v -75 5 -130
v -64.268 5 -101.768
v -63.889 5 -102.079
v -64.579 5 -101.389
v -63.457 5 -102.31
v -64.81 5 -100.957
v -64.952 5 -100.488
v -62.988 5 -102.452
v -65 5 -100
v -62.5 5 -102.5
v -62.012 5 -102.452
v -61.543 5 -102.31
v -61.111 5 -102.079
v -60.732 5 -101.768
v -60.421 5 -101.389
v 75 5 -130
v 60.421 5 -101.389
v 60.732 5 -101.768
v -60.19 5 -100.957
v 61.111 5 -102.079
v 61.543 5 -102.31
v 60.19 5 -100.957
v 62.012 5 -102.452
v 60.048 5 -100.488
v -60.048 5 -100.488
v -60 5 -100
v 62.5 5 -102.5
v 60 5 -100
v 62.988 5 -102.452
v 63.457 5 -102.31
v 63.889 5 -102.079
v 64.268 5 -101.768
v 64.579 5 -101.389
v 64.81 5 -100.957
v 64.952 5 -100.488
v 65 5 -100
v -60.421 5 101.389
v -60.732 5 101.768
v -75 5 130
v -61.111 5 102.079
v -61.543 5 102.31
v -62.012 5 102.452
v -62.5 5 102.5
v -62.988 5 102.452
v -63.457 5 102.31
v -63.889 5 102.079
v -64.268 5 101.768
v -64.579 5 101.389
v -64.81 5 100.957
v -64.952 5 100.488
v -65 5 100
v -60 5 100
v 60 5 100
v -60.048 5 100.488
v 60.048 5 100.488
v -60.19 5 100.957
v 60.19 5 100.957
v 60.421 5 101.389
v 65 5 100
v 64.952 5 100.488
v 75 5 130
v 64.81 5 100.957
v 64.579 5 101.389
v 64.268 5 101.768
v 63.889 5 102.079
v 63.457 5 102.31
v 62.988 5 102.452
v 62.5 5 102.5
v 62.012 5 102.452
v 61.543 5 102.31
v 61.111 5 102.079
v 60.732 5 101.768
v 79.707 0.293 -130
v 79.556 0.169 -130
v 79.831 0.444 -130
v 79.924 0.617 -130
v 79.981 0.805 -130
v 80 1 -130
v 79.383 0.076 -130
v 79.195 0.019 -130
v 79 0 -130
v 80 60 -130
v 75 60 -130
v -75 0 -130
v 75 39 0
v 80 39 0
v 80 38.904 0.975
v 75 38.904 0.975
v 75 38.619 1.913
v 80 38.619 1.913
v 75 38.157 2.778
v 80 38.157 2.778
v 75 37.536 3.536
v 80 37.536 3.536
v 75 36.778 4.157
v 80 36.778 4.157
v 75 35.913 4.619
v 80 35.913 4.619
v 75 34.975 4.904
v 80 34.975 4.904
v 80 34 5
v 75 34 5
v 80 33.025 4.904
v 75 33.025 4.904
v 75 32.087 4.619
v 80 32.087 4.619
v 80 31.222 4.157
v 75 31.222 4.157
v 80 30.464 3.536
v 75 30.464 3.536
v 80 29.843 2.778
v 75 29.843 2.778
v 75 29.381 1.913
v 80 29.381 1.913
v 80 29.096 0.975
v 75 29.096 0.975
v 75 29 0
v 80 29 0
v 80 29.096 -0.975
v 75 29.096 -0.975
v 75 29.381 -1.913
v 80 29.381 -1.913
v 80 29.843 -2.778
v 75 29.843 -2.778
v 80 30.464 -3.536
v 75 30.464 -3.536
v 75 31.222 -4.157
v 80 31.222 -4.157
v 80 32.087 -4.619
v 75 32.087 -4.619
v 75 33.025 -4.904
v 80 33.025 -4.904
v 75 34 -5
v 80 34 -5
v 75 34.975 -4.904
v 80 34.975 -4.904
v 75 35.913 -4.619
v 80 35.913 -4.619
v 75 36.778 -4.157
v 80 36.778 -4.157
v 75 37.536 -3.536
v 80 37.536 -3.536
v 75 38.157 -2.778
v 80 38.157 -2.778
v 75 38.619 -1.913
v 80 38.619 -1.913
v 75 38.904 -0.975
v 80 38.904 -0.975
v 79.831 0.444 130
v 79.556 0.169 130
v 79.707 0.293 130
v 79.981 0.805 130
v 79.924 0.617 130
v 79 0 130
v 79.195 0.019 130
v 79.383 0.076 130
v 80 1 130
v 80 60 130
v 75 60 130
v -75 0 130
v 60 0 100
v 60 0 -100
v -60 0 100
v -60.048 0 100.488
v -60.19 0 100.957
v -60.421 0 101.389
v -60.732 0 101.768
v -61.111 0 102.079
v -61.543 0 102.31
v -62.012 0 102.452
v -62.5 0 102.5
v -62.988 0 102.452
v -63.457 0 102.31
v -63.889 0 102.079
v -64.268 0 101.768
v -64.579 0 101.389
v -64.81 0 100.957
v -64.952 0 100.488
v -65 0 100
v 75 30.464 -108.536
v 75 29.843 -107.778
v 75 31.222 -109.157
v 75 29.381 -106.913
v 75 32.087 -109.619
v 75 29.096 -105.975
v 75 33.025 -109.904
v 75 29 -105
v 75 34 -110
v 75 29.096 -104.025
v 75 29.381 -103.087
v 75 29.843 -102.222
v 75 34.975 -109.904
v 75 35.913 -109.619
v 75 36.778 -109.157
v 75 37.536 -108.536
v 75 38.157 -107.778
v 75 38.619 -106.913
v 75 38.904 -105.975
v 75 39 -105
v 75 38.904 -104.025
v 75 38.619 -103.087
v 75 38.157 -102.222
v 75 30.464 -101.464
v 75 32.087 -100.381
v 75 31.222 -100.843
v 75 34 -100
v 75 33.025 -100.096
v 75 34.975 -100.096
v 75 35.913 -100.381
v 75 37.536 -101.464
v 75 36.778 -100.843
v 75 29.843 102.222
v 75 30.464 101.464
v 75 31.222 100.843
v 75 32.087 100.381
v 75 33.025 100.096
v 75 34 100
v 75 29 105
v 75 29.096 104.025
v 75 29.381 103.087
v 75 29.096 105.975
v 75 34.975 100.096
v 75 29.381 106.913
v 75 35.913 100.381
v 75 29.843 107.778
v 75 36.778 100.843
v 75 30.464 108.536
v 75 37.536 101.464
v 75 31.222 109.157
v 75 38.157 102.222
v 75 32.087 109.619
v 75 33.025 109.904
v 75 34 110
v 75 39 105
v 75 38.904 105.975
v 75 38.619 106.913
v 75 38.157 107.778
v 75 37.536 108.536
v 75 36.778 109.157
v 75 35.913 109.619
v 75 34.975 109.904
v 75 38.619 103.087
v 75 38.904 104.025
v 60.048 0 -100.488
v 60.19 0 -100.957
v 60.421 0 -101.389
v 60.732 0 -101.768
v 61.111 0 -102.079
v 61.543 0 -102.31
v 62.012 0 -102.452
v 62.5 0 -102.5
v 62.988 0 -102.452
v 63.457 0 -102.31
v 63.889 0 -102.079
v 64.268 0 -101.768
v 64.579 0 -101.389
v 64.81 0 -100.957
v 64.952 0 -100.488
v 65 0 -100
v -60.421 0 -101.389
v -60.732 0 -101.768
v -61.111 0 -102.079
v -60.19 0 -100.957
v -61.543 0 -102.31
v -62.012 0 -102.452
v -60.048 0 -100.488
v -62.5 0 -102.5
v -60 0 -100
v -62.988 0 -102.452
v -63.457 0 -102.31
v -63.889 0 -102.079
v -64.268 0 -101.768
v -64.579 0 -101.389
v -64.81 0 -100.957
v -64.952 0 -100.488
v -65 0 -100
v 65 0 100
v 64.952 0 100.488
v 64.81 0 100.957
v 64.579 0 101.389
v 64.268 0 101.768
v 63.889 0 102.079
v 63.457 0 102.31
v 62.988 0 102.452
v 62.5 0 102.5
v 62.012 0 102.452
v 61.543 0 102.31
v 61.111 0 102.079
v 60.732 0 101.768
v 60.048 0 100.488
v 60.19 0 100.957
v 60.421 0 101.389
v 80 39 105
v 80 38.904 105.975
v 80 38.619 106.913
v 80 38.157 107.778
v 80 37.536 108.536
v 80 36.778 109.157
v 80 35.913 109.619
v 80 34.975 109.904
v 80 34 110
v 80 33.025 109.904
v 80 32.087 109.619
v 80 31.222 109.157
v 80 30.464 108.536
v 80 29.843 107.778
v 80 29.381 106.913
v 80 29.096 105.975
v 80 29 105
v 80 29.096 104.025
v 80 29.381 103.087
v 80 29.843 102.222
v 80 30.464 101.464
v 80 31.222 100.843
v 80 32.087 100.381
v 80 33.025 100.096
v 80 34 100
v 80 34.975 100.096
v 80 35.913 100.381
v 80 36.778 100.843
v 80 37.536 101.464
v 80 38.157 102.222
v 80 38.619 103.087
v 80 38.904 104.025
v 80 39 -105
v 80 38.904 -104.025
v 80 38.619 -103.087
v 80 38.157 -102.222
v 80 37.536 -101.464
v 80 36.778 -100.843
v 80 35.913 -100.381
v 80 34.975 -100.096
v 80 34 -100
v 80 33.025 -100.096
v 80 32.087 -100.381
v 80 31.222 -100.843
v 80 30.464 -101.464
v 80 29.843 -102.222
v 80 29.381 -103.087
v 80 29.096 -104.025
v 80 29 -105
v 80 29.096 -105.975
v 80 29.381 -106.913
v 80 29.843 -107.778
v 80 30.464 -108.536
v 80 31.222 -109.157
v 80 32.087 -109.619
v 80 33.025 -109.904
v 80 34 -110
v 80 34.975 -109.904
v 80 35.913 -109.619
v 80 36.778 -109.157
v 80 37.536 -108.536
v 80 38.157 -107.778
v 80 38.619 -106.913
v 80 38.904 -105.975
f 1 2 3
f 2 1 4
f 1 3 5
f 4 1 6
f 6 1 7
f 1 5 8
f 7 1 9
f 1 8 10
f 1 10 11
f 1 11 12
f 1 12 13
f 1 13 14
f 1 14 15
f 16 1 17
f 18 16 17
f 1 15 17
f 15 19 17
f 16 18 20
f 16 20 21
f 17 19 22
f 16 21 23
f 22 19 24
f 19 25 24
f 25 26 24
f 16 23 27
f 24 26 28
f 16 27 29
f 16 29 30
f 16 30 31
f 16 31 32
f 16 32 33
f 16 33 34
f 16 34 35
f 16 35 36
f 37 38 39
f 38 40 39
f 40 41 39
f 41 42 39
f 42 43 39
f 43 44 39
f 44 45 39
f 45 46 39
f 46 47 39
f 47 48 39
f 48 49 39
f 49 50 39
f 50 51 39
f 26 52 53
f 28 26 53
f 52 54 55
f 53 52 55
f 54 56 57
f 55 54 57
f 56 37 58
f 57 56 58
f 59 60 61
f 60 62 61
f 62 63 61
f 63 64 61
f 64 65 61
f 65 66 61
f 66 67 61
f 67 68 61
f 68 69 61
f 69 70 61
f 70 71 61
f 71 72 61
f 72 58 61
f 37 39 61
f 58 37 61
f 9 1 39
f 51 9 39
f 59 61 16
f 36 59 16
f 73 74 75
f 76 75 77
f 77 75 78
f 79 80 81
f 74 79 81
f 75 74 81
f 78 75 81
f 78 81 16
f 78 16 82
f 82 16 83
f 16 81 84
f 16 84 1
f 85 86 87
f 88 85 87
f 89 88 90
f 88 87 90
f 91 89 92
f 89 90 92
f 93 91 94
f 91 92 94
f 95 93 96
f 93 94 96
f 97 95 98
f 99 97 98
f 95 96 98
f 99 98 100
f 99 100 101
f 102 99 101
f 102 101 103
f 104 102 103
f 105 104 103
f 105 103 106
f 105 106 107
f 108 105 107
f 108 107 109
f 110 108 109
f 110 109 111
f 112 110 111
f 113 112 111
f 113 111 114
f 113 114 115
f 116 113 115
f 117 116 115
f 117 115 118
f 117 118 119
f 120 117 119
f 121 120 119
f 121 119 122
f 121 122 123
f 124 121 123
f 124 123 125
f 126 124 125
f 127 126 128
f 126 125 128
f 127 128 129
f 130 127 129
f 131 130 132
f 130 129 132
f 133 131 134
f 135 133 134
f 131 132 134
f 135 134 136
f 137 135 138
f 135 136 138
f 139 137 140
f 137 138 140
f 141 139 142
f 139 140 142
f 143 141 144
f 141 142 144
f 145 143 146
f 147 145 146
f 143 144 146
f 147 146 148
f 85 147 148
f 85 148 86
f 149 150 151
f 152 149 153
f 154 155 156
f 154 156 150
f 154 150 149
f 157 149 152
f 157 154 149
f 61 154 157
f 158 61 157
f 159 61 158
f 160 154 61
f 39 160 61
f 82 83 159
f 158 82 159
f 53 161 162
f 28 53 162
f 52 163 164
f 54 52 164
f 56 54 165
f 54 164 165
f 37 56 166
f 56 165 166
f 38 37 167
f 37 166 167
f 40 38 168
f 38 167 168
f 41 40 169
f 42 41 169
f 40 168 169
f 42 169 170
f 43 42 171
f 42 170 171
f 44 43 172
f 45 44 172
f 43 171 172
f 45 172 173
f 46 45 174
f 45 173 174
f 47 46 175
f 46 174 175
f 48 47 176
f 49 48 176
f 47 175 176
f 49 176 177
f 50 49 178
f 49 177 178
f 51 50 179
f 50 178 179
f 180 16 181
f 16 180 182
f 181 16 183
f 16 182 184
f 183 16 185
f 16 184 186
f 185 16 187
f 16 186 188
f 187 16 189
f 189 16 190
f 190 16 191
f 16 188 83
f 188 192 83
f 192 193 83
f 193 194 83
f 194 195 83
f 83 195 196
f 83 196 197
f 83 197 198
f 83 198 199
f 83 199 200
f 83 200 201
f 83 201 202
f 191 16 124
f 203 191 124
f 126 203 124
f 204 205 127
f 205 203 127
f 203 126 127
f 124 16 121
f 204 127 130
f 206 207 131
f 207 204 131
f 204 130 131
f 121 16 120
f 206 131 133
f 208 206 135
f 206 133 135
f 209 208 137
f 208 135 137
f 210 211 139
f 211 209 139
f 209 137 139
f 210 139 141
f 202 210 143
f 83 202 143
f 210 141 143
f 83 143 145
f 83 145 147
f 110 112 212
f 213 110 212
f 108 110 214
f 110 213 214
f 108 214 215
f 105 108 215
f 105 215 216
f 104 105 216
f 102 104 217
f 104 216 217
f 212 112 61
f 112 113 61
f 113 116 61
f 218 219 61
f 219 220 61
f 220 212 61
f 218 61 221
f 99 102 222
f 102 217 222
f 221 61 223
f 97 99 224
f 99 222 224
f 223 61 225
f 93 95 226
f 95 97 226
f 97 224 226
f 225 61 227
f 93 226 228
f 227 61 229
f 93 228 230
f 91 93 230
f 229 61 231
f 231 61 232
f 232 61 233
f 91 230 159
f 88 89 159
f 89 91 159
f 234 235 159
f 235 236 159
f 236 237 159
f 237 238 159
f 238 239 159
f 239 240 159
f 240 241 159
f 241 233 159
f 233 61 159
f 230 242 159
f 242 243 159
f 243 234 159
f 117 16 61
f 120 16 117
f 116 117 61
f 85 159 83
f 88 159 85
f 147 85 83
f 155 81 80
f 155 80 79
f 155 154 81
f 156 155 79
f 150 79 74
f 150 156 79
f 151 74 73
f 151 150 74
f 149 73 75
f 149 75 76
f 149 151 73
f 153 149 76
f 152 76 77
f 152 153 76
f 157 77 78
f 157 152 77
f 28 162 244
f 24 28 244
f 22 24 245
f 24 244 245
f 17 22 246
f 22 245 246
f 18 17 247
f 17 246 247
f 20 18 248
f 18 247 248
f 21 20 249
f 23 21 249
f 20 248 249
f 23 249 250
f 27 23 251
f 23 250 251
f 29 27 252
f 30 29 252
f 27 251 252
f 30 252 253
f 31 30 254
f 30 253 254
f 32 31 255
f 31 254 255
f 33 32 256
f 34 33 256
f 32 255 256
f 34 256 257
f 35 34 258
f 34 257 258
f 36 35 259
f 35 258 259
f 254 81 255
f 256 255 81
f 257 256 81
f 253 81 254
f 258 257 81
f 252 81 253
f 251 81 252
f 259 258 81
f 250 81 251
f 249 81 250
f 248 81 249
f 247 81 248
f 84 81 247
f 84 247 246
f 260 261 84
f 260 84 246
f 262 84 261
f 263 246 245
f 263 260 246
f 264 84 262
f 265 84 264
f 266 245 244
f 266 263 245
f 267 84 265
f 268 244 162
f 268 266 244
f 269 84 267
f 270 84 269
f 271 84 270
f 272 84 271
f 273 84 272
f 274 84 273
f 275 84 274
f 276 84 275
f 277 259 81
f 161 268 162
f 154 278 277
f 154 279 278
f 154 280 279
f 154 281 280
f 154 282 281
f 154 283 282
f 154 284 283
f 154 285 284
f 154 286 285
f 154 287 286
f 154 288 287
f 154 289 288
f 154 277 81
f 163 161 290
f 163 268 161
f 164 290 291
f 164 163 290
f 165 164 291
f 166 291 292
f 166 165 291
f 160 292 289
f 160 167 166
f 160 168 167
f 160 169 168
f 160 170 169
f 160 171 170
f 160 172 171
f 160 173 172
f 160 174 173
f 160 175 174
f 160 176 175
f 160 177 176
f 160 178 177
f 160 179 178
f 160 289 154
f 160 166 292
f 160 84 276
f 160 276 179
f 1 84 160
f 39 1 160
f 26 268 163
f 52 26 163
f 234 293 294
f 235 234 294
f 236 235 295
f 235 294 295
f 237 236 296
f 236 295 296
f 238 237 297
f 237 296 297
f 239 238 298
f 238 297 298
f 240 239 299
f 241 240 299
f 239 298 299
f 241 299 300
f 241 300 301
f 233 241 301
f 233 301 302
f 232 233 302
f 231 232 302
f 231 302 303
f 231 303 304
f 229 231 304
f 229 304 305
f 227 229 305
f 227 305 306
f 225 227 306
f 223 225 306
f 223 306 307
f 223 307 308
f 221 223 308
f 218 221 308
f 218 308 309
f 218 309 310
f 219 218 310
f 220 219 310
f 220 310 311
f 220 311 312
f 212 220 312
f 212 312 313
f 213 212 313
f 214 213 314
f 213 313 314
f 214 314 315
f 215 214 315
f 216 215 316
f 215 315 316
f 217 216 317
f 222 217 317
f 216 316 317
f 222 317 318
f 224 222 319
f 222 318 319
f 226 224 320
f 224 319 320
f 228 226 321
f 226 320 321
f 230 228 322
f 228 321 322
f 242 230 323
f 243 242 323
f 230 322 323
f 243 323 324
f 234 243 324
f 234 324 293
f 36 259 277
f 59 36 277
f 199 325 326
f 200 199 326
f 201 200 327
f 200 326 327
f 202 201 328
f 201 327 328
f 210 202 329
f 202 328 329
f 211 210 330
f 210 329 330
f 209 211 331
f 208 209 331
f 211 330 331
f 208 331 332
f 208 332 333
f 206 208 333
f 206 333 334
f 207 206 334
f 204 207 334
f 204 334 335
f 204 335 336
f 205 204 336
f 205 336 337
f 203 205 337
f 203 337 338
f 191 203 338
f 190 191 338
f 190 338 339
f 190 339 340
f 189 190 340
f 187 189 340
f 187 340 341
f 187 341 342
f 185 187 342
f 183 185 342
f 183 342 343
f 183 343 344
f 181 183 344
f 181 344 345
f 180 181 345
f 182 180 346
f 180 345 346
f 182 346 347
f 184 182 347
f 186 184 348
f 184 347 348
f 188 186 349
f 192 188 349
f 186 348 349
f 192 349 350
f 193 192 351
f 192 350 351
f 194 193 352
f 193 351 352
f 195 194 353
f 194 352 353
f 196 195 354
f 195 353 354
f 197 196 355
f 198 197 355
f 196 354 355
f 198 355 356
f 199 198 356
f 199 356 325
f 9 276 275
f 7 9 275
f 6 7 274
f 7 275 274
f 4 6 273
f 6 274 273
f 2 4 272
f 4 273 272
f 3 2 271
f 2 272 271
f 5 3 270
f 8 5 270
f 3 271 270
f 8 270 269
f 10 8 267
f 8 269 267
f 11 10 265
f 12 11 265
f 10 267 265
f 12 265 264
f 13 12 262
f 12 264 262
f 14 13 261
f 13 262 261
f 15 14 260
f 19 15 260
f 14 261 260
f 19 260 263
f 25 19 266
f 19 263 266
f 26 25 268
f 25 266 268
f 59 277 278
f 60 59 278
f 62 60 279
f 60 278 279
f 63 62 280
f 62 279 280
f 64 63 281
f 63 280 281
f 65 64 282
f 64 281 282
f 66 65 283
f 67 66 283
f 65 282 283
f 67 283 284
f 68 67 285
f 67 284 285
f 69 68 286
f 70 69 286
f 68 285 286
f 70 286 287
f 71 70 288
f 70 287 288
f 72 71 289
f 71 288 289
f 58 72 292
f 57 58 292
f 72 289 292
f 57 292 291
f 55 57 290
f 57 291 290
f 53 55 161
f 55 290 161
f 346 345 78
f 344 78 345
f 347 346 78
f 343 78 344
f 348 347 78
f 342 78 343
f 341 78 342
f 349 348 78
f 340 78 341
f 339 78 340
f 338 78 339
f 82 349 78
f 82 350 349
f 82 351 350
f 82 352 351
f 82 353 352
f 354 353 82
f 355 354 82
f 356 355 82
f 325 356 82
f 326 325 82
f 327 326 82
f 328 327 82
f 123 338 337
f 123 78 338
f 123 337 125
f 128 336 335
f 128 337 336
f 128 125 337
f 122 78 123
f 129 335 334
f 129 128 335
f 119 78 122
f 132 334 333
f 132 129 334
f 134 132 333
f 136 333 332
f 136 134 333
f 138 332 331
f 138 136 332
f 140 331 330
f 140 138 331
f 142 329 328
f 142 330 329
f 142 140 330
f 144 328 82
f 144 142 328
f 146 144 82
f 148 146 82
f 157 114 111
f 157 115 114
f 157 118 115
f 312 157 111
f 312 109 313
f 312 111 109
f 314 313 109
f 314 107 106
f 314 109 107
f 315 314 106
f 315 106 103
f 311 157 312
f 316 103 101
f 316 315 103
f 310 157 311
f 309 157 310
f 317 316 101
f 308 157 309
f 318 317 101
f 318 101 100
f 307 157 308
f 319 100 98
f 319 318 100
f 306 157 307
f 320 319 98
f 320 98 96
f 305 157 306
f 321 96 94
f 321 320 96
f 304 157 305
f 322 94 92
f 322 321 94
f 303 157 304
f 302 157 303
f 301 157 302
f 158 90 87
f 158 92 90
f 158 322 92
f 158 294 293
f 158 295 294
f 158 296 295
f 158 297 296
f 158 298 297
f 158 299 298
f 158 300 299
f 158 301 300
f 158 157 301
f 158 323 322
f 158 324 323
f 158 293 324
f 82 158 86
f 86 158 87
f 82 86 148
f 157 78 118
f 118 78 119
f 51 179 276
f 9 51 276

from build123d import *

# Parameters (mm, degrees)
F0_W      = 150
F0_H      = 260
F1_DEPTH  = 5
F3_DEPTH  = 6
F5_DEPTH  = 6
F6_DEPTH  = 6
F7_DEPTH  = 6
F8_DEPTH  = 6
F9_W      = 60
F9_H      = 260
F10_DEPTH = 5
F11_R     = 5
F12_DEPTH = 6
F13_R     = 1


with BuildPart() as f1:
    # F0 (on Front) → F1 (new body)
    with BuildSketch(Plane.XZ):
        Rectangle(F0_W, F0_H)
    extrude(amount=-F1_DEPTH)

    # F2 (on face) → F3 (cut)
    with BuildSketch(Plane.XZ):
        with BuildLine():
            ThreePointArc((-60, 100), (-62.5, 102.5), (-65, 100))
            Line((-65, 100), (-60, 100))
        make_face()
        with BuildLine():
            ThreePointArc((-60, 100), (-62.5, 97.5), (-65, 100))
            Line((-65, 100), (-65, -100))
            ThreePointArc((-65, -100), (-62.5, -97.5), (-60, -100))
            Line((-60, -100), (-60, 100))
        make_face()
        with BuildLine():
            Line((-60, 100), (-65, 100))
            ThreePointArc((-65, 100), (-62.5, 97.5), (-60, 100))
        make_face()
        with BuildLine():
            ThreePointArc((-60, -100), (-62.5, -97.5), (-65, -100))
            Line((-65, -100), (-60, -100))
        make_face()
        with BuildLine():
            Line((-60, -100), (-65, -100))
            ThreePointArc((-65, -100), (-62.5, -102.5), (-60, -100))
        make_face()
    extrude(amount=-F3_DEPTH, mode=Mode.SUBTRACT)

    # F4 (on face) → F5 (cut)
    with BuildSketch(Plane.XZ):
        with BuildLine():
            ThreePointArc((65, 100), (62.5, 102.5), (60, 100))
            Line((60, 100), (65, 100))
        make_face()
        with BuildLine():
            ThreePointArc((65, 100), (62.5, 97.5), (60, 100))
            Line((60, 100), (60, -100))
            ThreePointArc((60, -100), (62.5, -97.5), (65, -100))
            Line((65, -100), (65, 100))
        make_face()
        with BuildLine():
            Line((65, 100), (60, 100))
            ThreePointArc((60, 100), (62.5, 97.5), (65, 100))
        make_face()
        with BuildLine():
            ThreePointArc((65, -100), (62.5, -97.5), (60, -100))
            Line((60, -100), (65, -100))
        make_face()
        with BuildLine():
            Line((65, -100), (60, -100))
            ThreePointArc((60, -100), (62.5, -102.5), (65, -100))
        make_face()
    extrude(amount=-F5_DEPTH, mode=Mode.SUBTRACT)

    # F4 (on face) → F6 (cut)
    with BuildSketch(Plane.XZ):
        with BuildLine():
            ThreePointArc((65, 100), (62.5, 102.5), (60, 100))
            Line((60, 100), (65, 100))
        make_face()
        with BuildLine():
            ThreePointArc((65, 100), (62.5, 97.5), (60, 100))
            Line((60, 100), (60, -100))
            ThreePointArc((60, -100), (62.5, -97.5), (65, -100))
            Line((65, -100), (65, 100))
        make_face()
        with BuildLine():
            Line((65, 100), (60, 100))
            ThreePointArc((60, 100), (62.5, 97.5), (65, 100))
        make_face()
        with BuildLine():
            ThreePointArc((65, -100), (62.5, -97.5), (60, -100))
            Line((60, -100), (65, -100))
        make_face()
        with BuildLine():
            Line((65, -100), (60, -100))
            ThreePointArc((60, -100), (62.5, -102.5), (65, -100))
        make_face()
    extrude(amount=-F6_DEPTH, mode=Mode.SUBTRACT)

    # F2 (on face) → F7 (cut)
    with BuildSketch(Plane.XZ):
        with BuildLine():
            ThreePointArc((-60, 100), (-62.5, 102.5), (-65, 100))
            Line((-65, 100), (-60, 100))
        make_face()
        with BuildLine():
            ThreePointArc((-60, 100), (-62.5, 97.5), (-65, 100))
            Line((-65, 100), (-65, -100))
            ThreePointArc((-65, -100), (-62.5, -97.5), (-60, -100))
            Line((-60, -100), (-60, 100))
        make_face()
        with BuildLine():
            Line((-60, 100), (-65, 100))
            ThreePointArc((-65, 100), (-62.5, 97.5), (-60, 100))
        make_face()
        with BuildLine():
            ThreePointArc((-60, -100), (-62.5, -97.5), (-65, -100))
            Line((-65, -100), (-60, -100))
        make_face()
        with BuildLine():
            Line((-60, -100), (-65, -100))
            ThreePointArc((-65, -100), (-62.5, -102.5), (-60, -100))
        make_face()
    extrude(amount=-F7_DEPTH, mode=Mode.SUBTRACT)

    # F4 (on face) → F8 (cut)
    with BuildSketch(Plane.XZ):
        with BuildLine():
            ThreePointArc((65, 100), (62.5, 102.5), (60, 100))
            Line((60, 100), (65, 100))
        make_face()
        with BuildLine():
            ThreePointArc((65, 100), (62.5, 97.5), (60, 100))
            Line((60, 100), (60, -100))
            ThreePointArc((60, -100), (62.5, -97.5), (65, -100))
            Line((65, -100), (65, 100))
        make_face()
        with BuildLine():
            Line((65, 100), (60, 100))
            ThreePointArc((60, 100), (62.5, 97.5), (65, 100))
        make_face()
        with BuildLine():
            ThreePointArc((65, -100), (62.5, -97.5), (60, -100))
            Line((60, -100), (65, -100))
        make_face()
        with BuildLine():
            Line((65, -100), (60, -100))
            ThreePointArc((60, -100), (62.5, -102.5), (65, -100))
        make_face()
    extrude(amount=-F8_DEPTH, mode=Mode.SUBTRACT)

    # F9 (on face) → F10 (join)
    with BuildSketch(Plane.YZ.offset(75)):
        with Locations((30, 0)):
            Rectangle(F9_W, F9_H)
    extrude(amount=F10_DEPTH)

    # F11 (on face) → F12 (cut)
    with BuildSketch(Plane.YZ.offset(80)):
        with Locations((34, 0)):
            Circle(F11_R)
        with Locations((34, 105)):
            Circle(F11_R)
        with Locations((34, -105)):
            Circle(F11_R)
    extrude(amount=-F12_DEPTH, mode=Mode.SUBTRACT)

    # F13
    f13_edges = [f1.edges().sort_by_distance(p)[0] for p in [
        (80, 0, 0),
    ]]
    fillet(f13_edges, radius=F13_R)


solid = f1.part
